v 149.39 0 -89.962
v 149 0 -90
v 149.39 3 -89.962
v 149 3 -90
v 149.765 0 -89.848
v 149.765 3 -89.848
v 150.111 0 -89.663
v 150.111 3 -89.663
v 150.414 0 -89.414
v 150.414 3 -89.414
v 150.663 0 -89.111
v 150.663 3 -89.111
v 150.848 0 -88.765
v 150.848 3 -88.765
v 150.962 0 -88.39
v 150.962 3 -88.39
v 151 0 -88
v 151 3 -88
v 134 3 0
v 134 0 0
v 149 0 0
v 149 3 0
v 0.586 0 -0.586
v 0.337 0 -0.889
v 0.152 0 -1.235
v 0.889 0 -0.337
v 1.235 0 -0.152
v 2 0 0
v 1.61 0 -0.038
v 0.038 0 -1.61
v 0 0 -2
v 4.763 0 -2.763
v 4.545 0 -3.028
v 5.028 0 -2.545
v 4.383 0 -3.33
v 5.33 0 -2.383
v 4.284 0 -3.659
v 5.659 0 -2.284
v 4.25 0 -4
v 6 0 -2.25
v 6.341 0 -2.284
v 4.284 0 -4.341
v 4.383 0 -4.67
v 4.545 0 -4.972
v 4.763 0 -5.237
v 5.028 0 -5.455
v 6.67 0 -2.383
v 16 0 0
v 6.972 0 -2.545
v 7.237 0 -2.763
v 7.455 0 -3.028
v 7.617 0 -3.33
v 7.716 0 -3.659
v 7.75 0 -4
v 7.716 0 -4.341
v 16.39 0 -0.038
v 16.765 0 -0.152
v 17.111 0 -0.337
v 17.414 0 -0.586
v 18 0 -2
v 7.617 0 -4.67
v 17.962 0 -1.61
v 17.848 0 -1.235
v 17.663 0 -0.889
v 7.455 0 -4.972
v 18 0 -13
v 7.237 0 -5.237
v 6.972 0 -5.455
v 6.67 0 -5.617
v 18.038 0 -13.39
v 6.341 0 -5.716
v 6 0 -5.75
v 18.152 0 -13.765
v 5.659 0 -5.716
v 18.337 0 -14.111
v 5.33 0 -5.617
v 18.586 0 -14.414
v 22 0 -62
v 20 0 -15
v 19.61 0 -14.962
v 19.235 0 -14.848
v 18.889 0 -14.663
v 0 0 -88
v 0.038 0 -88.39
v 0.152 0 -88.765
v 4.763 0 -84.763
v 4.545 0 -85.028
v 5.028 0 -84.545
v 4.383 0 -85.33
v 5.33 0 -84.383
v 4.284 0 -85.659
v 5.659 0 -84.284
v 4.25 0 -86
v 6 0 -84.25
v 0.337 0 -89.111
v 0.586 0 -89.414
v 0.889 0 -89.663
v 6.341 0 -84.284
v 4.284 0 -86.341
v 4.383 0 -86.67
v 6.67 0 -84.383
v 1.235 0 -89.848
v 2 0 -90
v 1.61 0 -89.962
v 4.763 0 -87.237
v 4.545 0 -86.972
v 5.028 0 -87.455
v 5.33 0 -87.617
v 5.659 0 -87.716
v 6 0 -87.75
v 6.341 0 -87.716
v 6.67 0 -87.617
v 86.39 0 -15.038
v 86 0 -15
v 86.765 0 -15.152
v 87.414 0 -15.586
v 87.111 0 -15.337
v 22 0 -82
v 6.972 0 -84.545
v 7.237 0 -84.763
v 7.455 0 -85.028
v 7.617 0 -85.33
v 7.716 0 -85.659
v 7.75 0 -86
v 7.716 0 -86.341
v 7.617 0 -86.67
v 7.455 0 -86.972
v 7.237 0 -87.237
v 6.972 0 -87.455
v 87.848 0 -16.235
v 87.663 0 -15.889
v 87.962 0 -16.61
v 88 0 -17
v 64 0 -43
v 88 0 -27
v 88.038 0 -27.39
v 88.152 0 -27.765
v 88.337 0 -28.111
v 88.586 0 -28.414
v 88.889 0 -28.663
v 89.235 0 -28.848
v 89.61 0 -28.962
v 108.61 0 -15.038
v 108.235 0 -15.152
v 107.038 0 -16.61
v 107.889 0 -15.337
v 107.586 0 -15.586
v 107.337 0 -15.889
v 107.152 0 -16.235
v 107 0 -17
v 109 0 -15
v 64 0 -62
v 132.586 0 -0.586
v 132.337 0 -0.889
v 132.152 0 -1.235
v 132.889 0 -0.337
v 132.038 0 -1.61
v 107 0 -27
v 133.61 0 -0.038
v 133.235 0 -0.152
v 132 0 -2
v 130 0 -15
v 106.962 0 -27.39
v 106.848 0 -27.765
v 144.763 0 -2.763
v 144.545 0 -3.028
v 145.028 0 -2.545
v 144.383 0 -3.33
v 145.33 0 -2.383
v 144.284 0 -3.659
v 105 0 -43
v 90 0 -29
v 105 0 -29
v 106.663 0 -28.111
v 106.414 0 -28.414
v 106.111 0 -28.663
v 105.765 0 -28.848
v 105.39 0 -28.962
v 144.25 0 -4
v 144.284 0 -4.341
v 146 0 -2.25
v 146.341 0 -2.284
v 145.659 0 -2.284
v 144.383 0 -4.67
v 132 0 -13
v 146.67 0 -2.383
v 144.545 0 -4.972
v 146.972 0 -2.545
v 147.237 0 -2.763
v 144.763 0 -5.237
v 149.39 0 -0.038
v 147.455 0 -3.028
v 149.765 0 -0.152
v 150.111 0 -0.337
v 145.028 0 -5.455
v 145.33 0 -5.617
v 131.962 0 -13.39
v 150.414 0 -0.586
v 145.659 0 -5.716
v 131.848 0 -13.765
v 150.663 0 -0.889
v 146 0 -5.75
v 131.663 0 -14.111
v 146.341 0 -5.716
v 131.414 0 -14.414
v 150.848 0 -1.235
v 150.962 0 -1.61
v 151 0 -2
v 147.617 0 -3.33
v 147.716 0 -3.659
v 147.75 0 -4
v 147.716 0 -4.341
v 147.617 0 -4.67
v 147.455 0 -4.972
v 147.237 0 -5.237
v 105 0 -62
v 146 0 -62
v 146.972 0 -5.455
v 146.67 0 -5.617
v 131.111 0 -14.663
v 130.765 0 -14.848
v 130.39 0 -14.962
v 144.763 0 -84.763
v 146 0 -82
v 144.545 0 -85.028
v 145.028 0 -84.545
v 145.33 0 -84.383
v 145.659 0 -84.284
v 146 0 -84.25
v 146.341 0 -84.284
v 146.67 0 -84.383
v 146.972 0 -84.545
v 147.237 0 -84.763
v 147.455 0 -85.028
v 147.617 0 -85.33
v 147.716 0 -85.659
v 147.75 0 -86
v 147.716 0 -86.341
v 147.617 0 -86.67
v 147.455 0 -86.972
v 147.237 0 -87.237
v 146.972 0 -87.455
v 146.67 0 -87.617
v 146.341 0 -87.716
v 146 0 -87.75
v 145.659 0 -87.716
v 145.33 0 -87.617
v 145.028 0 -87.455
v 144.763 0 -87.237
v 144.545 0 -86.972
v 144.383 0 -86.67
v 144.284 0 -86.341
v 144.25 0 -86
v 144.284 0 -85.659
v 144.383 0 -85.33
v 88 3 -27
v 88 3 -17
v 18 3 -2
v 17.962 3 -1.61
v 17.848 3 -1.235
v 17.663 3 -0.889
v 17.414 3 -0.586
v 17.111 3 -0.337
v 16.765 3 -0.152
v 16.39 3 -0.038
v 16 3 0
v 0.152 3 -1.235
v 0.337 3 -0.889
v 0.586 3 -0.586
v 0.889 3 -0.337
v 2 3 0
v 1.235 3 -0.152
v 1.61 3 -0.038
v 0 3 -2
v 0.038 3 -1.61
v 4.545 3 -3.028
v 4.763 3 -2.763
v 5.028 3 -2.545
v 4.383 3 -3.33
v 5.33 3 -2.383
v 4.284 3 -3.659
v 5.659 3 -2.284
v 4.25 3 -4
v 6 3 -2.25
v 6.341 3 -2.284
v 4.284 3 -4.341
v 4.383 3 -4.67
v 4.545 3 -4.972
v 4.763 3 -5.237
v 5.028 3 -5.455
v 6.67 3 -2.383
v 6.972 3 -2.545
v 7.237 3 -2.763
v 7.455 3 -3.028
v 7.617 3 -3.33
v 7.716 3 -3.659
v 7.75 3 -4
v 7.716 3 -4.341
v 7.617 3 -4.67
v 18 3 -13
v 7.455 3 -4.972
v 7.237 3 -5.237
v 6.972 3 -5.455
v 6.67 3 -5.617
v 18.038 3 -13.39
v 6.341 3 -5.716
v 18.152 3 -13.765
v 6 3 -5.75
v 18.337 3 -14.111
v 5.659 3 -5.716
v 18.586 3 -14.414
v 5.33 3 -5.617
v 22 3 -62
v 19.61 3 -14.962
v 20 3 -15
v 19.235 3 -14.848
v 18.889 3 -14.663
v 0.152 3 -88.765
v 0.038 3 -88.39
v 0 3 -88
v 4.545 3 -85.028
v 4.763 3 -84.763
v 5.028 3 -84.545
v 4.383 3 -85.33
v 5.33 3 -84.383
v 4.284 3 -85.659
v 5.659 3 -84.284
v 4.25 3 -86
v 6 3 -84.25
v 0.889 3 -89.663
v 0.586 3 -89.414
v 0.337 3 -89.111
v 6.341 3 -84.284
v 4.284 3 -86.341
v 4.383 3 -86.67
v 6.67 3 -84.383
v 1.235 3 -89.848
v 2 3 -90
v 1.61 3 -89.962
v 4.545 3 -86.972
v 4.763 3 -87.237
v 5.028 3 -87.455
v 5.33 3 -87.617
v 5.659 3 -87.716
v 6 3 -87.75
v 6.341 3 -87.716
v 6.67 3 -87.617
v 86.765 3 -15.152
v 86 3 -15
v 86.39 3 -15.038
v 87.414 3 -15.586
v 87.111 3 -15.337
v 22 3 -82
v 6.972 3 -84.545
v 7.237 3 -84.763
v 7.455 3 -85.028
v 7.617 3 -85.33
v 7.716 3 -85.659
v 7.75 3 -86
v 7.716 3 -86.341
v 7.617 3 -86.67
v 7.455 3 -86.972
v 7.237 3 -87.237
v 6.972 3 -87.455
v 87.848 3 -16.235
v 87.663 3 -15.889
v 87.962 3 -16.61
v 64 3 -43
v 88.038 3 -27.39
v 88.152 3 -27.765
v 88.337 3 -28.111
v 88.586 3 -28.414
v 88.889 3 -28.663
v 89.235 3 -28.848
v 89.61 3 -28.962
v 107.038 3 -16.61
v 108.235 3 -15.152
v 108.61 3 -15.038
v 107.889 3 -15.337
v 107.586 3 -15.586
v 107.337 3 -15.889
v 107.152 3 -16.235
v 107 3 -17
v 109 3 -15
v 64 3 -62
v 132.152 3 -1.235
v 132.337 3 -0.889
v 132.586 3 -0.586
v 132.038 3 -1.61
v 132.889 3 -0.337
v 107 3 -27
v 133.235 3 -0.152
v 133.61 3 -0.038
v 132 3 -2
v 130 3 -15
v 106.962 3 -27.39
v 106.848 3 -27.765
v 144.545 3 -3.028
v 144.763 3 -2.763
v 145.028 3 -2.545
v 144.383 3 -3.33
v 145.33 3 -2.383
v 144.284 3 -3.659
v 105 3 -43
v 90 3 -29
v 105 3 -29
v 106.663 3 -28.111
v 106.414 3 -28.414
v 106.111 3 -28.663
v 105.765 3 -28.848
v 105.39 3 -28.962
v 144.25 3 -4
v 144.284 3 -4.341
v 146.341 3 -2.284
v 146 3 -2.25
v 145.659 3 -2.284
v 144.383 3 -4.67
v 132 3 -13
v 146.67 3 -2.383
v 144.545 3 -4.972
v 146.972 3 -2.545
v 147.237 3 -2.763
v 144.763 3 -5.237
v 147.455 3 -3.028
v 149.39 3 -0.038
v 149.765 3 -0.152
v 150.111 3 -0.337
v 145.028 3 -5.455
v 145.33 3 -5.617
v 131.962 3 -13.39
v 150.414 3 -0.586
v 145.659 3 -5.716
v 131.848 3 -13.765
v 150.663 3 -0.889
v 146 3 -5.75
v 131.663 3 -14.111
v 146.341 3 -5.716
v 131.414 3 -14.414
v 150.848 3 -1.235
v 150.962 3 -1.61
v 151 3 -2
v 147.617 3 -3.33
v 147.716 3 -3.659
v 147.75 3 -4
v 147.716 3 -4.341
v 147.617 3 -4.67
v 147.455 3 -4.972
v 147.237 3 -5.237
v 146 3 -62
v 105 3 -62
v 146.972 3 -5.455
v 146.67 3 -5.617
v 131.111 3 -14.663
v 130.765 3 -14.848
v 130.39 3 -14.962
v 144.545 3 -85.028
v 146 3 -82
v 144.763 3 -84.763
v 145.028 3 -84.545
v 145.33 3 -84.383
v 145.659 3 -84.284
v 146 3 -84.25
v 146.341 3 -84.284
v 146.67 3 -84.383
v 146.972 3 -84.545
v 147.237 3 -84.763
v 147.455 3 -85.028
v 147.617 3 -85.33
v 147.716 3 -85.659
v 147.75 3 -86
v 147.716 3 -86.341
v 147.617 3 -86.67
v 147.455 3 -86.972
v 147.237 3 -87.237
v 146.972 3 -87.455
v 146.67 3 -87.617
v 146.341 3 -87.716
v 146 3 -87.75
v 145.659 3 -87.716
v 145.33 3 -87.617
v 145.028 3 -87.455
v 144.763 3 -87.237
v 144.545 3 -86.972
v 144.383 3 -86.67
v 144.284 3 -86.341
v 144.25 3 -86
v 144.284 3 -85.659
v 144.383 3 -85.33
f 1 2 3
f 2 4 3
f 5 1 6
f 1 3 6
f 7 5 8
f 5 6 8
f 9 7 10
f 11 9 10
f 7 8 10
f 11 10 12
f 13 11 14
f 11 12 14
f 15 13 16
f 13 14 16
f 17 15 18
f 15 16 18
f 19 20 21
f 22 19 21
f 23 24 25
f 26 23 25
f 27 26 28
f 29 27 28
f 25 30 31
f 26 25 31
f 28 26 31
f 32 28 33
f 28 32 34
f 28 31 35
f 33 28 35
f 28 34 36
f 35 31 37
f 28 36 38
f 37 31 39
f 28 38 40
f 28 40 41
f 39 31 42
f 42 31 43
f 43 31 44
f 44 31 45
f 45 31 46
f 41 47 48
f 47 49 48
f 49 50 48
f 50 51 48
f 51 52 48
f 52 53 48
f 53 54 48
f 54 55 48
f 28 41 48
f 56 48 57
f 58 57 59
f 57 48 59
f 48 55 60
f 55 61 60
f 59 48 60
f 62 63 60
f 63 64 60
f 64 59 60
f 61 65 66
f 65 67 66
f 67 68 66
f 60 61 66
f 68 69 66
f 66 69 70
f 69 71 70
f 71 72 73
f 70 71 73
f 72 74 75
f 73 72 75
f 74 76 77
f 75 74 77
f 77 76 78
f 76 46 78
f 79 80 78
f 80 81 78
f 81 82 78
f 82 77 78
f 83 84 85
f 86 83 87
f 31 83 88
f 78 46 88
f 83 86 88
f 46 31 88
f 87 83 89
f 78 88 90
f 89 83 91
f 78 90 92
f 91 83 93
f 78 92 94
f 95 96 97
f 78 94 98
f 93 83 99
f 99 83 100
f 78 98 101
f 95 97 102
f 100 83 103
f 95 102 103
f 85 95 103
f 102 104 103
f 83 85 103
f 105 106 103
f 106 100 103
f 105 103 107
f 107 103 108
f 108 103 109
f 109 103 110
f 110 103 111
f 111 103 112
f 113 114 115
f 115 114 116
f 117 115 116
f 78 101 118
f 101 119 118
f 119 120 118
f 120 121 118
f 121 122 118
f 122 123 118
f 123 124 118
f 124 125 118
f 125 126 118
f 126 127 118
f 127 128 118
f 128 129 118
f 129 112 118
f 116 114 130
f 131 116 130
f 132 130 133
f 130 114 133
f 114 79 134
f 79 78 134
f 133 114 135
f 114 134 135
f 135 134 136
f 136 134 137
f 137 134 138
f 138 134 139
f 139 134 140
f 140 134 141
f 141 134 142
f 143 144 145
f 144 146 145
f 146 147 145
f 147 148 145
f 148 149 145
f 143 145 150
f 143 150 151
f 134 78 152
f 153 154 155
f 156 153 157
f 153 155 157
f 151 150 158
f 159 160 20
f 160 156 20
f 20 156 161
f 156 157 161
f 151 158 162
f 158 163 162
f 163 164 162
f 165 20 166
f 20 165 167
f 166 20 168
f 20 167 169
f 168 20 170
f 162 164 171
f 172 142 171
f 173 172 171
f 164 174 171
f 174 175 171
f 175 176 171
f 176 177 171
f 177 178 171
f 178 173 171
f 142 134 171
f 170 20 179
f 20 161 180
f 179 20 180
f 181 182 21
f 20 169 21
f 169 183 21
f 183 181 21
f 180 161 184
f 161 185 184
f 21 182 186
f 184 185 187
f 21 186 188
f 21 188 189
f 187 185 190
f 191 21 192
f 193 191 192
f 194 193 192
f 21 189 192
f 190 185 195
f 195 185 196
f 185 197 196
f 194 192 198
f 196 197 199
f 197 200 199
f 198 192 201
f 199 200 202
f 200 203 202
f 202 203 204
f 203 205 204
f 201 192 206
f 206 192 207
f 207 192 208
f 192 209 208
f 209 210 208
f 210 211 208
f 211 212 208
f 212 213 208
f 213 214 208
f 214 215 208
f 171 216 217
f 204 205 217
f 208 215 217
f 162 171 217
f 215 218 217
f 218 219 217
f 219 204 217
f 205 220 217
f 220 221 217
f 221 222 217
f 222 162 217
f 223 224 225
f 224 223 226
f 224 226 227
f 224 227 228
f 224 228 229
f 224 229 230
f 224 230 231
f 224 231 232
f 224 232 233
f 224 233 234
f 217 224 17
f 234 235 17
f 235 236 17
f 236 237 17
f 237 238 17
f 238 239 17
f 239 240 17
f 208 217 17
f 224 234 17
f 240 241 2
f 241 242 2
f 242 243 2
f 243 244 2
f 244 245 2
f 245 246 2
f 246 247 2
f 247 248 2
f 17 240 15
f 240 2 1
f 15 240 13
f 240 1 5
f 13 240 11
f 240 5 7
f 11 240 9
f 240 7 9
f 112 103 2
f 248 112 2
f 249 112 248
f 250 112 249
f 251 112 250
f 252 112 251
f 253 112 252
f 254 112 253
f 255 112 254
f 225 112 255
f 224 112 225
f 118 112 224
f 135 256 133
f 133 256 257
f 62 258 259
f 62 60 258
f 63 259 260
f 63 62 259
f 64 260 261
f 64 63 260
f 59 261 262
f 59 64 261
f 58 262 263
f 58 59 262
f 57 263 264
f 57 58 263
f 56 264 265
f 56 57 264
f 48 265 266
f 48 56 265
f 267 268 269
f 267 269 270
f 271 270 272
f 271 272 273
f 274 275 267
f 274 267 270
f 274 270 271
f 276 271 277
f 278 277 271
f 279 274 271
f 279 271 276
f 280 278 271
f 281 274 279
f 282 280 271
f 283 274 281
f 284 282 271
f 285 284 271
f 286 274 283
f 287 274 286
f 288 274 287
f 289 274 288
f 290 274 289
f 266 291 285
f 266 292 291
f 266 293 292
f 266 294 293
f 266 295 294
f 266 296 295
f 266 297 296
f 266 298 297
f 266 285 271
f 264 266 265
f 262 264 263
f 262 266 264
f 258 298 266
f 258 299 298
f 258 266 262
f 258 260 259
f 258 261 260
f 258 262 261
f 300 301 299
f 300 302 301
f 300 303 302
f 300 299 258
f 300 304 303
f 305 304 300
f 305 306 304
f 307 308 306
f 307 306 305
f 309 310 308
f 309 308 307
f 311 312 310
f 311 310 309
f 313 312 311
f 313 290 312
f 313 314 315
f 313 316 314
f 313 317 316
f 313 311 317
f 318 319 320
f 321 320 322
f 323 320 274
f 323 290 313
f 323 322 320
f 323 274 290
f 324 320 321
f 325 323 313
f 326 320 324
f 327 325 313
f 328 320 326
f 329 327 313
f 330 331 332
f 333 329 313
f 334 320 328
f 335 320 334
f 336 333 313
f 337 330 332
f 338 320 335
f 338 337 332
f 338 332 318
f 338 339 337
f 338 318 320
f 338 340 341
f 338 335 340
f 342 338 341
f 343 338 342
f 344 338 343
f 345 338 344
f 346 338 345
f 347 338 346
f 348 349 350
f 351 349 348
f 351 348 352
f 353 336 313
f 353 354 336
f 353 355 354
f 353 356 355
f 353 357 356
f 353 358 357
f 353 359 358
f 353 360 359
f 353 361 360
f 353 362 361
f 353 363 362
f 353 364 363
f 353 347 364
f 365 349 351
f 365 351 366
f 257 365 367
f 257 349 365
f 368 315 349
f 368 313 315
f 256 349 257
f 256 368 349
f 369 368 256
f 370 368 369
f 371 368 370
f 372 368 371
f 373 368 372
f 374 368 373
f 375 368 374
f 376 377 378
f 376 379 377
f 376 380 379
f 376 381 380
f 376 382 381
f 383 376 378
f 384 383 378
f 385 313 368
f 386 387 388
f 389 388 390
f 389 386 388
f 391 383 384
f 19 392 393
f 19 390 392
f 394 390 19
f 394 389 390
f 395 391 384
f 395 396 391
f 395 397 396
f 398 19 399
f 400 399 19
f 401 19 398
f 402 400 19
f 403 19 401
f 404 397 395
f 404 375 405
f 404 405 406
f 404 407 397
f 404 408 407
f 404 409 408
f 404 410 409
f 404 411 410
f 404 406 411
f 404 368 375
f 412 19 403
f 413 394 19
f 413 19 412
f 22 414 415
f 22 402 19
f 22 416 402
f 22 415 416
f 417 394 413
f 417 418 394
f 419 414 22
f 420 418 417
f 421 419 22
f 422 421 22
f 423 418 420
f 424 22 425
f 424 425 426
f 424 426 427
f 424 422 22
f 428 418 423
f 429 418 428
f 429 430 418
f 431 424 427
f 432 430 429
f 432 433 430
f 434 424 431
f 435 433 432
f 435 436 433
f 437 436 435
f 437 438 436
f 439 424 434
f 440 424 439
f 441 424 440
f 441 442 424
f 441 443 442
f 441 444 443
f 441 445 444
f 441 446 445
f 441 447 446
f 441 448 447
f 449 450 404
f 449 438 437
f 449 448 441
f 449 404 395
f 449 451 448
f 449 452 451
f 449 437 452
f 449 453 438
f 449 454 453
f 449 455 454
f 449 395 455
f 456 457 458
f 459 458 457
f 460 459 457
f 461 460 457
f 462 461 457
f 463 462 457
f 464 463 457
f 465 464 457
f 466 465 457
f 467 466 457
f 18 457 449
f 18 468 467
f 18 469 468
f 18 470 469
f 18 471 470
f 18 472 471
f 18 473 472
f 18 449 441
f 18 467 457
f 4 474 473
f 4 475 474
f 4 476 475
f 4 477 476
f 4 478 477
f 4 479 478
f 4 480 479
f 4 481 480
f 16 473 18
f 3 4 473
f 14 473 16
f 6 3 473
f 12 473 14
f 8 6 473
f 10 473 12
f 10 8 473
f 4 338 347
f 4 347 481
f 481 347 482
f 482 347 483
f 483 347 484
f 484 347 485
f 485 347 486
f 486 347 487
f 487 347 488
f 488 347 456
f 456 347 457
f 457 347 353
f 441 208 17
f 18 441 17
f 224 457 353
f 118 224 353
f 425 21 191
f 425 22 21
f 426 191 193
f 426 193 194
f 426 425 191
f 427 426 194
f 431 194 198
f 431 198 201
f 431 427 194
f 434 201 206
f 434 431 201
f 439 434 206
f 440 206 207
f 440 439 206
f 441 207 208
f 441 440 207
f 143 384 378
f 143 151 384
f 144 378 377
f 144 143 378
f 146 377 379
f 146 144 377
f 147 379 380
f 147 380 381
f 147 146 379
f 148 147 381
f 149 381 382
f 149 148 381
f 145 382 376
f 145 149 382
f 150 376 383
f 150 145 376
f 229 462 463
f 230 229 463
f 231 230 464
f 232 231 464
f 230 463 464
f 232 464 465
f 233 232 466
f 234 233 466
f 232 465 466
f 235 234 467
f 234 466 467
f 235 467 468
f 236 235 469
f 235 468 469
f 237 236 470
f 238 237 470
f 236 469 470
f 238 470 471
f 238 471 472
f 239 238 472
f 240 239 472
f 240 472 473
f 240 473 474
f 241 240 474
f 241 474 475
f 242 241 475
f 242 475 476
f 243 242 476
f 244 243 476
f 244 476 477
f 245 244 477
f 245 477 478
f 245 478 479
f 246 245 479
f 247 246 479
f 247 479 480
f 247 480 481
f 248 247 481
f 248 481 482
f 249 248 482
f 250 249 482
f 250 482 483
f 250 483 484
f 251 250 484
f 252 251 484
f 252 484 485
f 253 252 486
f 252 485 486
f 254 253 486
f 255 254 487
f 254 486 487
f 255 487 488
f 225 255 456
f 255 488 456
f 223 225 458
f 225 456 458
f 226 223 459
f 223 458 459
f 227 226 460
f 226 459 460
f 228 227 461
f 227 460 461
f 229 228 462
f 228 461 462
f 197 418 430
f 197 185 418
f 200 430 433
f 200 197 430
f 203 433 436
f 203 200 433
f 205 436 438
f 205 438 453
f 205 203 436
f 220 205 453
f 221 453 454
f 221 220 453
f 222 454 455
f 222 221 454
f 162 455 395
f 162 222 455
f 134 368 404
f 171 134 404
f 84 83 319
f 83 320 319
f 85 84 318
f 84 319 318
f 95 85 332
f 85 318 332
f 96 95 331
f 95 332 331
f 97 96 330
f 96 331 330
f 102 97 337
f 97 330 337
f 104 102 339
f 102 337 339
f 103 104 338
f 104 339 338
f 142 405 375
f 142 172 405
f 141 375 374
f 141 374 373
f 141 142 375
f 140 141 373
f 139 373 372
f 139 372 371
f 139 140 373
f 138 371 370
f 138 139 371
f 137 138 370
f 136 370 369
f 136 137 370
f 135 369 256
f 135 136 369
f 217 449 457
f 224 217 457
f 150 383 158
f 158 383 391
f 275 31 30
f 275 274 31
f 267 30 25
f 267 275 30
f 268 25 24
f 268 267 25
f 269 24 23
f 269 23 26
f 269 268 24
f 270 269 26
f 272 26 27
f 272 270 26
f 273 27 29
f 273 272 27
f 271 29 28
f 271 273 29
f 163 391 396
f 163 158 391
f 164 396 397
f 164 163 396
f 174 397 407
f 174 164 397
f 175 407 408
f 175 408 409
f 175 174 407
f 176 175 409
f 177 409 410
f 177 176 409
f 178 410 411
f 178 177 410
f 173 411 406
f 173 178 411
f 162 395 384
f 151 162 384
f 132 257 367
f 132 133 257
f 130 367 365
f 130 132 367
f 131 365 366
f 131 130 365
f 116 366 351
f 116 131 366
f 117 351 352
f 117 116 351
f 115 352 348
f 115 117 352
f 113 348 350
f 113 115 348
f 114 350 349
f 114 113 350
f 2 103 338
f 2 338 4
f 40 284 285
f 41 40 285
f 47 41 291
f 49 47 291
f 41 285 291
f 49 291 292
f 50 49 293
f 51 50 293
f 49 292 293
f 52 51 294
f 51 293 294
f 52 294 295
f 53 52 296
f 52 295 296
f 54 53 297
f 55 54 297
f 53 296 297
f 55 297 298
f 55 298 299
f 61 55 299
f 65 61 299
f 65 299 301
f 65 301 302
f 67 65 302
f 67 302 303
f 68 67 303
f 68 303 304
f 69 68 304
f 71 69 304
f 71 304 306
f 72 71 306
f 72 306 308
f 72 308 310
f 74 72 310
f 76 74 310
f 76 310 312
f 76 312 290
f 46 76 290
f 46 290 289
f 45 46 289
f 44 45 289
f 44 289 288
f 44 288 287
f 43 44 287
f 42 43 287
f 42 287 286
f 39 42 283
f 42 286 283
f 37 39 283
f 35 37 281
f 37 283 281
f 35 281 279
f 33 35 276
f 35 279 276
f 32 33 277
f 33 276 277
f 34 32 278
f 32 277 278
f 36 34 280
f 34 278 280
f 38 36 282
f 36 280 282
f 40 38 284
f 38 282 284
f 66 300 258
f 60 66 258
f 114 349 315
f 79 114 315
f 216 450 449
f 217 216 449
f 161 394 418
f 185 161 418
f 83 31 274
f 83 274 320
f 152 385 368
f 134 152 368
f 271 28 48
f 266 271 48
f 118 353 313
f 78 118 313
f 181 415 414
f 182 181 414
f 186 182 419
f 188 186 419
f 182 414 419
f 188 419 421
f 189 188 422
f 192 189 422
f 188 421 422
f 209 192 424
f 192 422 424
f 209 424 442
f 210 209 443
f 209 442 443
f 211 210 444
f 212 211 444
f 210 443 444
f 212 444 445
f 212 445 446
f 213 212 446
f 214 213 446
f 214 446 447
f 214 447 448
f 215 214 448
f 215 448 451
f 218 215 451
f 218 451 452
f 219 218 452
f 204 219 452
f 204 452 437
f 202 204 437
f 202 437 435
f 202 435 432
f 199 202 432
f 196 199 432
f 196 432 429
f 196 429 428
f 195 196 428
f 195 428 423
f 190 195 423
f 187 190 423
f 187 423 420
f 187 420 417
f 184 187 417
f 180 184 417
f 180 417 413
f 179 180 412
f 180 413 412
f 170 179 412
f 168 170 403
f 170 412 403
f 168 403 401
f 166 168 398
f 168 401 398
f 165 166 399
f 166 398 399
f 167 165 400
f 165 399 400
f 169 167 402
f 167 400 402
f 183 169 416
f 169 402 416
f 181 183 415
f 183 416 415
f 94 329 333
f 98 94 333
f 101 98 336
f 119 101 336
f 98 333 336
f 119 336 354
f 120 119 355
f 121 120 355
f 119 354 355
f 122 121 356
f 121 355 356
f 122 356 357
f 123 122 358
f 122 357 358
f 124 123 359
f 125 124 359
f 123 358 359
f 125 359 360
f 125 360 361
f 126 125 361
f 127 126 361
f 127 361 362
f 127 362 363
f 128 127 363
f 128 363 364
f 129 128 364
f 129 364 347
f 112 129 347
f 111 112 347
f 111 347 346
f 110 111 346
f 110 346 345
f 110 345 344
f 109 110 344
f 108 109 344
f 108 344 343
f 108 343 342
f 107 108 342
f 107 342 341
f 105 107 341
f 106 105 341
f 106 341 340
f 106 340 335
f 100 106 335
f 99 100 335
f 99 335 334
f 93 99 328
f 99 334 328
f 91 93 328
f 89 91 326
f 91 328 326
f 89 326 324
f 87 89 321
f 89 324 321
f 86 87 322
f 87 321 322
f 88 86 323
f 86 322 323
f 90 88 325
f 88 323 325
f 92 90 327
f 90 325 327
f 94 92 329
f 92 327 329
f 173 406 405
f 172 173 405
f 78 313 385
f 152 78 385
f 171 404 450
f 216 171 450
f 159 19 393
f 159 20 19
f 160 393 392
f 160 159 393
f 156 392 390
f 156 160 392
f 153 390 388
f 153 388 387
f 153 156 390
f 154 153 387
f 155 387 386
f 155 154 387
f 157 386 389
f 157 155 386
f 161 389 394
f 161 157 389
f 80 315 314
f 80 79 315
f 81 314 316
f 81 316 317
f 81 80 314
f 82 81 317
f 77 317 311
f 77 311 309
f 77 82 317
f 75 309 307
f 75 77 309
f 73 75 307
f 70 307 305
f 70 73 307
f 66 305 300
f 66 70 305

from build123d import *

# Parameters (mm, degrees)
SKETCH1_W           = 151
SKETCH1_H           = 90
BOSS_EXTRUDE1_DEPTH = 3
SKETCH2_R           = 1.75
CUT_EXTRUDE1_DEPTH  = 176.812400018
FILLET1_R           = 2
CUT_EXTRUDE2_DEPTH  = 176.812400018
FILLET2_R           = 2


with BuildPart() as part:
    # Sketch1 → Boss-Extrude1 (new body)
    with BuildSketch(Plane(origin=(0, 0, 0), x_dir=(1, 0, 0), z_dir=(0, 1, 0))):
        with Locations((75.5, 45)):
            Rectangle(SKETCH1_W, SKETCH1_H)
    extrude(amount=BOSS_EXTRUDE1_DEPTH)

    # Sketch2 → Cut-Extrude1 (cut, through all)
    with BuildSketch(Plane(origin=(0, 3, 0), x_dir=(1, 0, 0), z_dir=(0, 1, 0))):
        with Locations(Location((146, 86, 0), (0, 0, 270))):
            Circle(SKETCH2_R)
        with Locations(Location((146, 4, 0), (0, 0, 270))):
            Circle(SKETCH2_R)
        with Locations(Location((6, 86, 0), (0, 0, 270))):
            Circle(SKETCH2_R)
        with Locations(Location((6, 4, 0), (0, 0, 270))):
            Circle(SKETCH2_R)
    extrude(amount=-CUT_EXTRUDE1_DEPTH, mode=Mode.SUBTRACT)

    # Fillet1
    fillet1_edges = [part.edges().sort_by_distance(p)[0] for p in [
        (0, 1.5, -90),
        (151, 1.5, -90),
        (151, 1.5, 0),
        (0, 1.5, 0),
    ]]
    fillet(fillet1_edges, radius=FILLET1_R)

    # Sketch3 → Cut-Extrude2 (cut, through all)
    with BuildSketch(Plane(origin=(0, 3, 0), x_dir=(1, 0, 0), z_dir=(0, 1, 0))):
        Polygon((105, 62), (146, 62), (146, 82), (22, 82), (22, 62), (64, 62), (64, 43), (105, 43), align=None)
        Polygon((18, 0), (132, 0), (132, 15), (107, 15), (107, 29), (88, 29), (88, 15), (18, 15), align=None)
    extrude(amount=-CUT_EXTRUDE2_DEPTH, mode=Mode.SUBTRACT)

    # Fillet2
    fillet2_edges = [part.edges().sort_by_distance(p)[0] for p in [
        (18, 1.5, 0),
        (18, 1.5, -15),
        (88, 1.5, -15),
        (88, 1.5, -29),
        (107, 1.5, -29),
        (107, 1.5, -15),
        (132, 1.5, -15),
        (132, 1.5, 0),
    ]]
    fillet(fillet2_edges, radius=FILLET2_R)


solid = part.part
